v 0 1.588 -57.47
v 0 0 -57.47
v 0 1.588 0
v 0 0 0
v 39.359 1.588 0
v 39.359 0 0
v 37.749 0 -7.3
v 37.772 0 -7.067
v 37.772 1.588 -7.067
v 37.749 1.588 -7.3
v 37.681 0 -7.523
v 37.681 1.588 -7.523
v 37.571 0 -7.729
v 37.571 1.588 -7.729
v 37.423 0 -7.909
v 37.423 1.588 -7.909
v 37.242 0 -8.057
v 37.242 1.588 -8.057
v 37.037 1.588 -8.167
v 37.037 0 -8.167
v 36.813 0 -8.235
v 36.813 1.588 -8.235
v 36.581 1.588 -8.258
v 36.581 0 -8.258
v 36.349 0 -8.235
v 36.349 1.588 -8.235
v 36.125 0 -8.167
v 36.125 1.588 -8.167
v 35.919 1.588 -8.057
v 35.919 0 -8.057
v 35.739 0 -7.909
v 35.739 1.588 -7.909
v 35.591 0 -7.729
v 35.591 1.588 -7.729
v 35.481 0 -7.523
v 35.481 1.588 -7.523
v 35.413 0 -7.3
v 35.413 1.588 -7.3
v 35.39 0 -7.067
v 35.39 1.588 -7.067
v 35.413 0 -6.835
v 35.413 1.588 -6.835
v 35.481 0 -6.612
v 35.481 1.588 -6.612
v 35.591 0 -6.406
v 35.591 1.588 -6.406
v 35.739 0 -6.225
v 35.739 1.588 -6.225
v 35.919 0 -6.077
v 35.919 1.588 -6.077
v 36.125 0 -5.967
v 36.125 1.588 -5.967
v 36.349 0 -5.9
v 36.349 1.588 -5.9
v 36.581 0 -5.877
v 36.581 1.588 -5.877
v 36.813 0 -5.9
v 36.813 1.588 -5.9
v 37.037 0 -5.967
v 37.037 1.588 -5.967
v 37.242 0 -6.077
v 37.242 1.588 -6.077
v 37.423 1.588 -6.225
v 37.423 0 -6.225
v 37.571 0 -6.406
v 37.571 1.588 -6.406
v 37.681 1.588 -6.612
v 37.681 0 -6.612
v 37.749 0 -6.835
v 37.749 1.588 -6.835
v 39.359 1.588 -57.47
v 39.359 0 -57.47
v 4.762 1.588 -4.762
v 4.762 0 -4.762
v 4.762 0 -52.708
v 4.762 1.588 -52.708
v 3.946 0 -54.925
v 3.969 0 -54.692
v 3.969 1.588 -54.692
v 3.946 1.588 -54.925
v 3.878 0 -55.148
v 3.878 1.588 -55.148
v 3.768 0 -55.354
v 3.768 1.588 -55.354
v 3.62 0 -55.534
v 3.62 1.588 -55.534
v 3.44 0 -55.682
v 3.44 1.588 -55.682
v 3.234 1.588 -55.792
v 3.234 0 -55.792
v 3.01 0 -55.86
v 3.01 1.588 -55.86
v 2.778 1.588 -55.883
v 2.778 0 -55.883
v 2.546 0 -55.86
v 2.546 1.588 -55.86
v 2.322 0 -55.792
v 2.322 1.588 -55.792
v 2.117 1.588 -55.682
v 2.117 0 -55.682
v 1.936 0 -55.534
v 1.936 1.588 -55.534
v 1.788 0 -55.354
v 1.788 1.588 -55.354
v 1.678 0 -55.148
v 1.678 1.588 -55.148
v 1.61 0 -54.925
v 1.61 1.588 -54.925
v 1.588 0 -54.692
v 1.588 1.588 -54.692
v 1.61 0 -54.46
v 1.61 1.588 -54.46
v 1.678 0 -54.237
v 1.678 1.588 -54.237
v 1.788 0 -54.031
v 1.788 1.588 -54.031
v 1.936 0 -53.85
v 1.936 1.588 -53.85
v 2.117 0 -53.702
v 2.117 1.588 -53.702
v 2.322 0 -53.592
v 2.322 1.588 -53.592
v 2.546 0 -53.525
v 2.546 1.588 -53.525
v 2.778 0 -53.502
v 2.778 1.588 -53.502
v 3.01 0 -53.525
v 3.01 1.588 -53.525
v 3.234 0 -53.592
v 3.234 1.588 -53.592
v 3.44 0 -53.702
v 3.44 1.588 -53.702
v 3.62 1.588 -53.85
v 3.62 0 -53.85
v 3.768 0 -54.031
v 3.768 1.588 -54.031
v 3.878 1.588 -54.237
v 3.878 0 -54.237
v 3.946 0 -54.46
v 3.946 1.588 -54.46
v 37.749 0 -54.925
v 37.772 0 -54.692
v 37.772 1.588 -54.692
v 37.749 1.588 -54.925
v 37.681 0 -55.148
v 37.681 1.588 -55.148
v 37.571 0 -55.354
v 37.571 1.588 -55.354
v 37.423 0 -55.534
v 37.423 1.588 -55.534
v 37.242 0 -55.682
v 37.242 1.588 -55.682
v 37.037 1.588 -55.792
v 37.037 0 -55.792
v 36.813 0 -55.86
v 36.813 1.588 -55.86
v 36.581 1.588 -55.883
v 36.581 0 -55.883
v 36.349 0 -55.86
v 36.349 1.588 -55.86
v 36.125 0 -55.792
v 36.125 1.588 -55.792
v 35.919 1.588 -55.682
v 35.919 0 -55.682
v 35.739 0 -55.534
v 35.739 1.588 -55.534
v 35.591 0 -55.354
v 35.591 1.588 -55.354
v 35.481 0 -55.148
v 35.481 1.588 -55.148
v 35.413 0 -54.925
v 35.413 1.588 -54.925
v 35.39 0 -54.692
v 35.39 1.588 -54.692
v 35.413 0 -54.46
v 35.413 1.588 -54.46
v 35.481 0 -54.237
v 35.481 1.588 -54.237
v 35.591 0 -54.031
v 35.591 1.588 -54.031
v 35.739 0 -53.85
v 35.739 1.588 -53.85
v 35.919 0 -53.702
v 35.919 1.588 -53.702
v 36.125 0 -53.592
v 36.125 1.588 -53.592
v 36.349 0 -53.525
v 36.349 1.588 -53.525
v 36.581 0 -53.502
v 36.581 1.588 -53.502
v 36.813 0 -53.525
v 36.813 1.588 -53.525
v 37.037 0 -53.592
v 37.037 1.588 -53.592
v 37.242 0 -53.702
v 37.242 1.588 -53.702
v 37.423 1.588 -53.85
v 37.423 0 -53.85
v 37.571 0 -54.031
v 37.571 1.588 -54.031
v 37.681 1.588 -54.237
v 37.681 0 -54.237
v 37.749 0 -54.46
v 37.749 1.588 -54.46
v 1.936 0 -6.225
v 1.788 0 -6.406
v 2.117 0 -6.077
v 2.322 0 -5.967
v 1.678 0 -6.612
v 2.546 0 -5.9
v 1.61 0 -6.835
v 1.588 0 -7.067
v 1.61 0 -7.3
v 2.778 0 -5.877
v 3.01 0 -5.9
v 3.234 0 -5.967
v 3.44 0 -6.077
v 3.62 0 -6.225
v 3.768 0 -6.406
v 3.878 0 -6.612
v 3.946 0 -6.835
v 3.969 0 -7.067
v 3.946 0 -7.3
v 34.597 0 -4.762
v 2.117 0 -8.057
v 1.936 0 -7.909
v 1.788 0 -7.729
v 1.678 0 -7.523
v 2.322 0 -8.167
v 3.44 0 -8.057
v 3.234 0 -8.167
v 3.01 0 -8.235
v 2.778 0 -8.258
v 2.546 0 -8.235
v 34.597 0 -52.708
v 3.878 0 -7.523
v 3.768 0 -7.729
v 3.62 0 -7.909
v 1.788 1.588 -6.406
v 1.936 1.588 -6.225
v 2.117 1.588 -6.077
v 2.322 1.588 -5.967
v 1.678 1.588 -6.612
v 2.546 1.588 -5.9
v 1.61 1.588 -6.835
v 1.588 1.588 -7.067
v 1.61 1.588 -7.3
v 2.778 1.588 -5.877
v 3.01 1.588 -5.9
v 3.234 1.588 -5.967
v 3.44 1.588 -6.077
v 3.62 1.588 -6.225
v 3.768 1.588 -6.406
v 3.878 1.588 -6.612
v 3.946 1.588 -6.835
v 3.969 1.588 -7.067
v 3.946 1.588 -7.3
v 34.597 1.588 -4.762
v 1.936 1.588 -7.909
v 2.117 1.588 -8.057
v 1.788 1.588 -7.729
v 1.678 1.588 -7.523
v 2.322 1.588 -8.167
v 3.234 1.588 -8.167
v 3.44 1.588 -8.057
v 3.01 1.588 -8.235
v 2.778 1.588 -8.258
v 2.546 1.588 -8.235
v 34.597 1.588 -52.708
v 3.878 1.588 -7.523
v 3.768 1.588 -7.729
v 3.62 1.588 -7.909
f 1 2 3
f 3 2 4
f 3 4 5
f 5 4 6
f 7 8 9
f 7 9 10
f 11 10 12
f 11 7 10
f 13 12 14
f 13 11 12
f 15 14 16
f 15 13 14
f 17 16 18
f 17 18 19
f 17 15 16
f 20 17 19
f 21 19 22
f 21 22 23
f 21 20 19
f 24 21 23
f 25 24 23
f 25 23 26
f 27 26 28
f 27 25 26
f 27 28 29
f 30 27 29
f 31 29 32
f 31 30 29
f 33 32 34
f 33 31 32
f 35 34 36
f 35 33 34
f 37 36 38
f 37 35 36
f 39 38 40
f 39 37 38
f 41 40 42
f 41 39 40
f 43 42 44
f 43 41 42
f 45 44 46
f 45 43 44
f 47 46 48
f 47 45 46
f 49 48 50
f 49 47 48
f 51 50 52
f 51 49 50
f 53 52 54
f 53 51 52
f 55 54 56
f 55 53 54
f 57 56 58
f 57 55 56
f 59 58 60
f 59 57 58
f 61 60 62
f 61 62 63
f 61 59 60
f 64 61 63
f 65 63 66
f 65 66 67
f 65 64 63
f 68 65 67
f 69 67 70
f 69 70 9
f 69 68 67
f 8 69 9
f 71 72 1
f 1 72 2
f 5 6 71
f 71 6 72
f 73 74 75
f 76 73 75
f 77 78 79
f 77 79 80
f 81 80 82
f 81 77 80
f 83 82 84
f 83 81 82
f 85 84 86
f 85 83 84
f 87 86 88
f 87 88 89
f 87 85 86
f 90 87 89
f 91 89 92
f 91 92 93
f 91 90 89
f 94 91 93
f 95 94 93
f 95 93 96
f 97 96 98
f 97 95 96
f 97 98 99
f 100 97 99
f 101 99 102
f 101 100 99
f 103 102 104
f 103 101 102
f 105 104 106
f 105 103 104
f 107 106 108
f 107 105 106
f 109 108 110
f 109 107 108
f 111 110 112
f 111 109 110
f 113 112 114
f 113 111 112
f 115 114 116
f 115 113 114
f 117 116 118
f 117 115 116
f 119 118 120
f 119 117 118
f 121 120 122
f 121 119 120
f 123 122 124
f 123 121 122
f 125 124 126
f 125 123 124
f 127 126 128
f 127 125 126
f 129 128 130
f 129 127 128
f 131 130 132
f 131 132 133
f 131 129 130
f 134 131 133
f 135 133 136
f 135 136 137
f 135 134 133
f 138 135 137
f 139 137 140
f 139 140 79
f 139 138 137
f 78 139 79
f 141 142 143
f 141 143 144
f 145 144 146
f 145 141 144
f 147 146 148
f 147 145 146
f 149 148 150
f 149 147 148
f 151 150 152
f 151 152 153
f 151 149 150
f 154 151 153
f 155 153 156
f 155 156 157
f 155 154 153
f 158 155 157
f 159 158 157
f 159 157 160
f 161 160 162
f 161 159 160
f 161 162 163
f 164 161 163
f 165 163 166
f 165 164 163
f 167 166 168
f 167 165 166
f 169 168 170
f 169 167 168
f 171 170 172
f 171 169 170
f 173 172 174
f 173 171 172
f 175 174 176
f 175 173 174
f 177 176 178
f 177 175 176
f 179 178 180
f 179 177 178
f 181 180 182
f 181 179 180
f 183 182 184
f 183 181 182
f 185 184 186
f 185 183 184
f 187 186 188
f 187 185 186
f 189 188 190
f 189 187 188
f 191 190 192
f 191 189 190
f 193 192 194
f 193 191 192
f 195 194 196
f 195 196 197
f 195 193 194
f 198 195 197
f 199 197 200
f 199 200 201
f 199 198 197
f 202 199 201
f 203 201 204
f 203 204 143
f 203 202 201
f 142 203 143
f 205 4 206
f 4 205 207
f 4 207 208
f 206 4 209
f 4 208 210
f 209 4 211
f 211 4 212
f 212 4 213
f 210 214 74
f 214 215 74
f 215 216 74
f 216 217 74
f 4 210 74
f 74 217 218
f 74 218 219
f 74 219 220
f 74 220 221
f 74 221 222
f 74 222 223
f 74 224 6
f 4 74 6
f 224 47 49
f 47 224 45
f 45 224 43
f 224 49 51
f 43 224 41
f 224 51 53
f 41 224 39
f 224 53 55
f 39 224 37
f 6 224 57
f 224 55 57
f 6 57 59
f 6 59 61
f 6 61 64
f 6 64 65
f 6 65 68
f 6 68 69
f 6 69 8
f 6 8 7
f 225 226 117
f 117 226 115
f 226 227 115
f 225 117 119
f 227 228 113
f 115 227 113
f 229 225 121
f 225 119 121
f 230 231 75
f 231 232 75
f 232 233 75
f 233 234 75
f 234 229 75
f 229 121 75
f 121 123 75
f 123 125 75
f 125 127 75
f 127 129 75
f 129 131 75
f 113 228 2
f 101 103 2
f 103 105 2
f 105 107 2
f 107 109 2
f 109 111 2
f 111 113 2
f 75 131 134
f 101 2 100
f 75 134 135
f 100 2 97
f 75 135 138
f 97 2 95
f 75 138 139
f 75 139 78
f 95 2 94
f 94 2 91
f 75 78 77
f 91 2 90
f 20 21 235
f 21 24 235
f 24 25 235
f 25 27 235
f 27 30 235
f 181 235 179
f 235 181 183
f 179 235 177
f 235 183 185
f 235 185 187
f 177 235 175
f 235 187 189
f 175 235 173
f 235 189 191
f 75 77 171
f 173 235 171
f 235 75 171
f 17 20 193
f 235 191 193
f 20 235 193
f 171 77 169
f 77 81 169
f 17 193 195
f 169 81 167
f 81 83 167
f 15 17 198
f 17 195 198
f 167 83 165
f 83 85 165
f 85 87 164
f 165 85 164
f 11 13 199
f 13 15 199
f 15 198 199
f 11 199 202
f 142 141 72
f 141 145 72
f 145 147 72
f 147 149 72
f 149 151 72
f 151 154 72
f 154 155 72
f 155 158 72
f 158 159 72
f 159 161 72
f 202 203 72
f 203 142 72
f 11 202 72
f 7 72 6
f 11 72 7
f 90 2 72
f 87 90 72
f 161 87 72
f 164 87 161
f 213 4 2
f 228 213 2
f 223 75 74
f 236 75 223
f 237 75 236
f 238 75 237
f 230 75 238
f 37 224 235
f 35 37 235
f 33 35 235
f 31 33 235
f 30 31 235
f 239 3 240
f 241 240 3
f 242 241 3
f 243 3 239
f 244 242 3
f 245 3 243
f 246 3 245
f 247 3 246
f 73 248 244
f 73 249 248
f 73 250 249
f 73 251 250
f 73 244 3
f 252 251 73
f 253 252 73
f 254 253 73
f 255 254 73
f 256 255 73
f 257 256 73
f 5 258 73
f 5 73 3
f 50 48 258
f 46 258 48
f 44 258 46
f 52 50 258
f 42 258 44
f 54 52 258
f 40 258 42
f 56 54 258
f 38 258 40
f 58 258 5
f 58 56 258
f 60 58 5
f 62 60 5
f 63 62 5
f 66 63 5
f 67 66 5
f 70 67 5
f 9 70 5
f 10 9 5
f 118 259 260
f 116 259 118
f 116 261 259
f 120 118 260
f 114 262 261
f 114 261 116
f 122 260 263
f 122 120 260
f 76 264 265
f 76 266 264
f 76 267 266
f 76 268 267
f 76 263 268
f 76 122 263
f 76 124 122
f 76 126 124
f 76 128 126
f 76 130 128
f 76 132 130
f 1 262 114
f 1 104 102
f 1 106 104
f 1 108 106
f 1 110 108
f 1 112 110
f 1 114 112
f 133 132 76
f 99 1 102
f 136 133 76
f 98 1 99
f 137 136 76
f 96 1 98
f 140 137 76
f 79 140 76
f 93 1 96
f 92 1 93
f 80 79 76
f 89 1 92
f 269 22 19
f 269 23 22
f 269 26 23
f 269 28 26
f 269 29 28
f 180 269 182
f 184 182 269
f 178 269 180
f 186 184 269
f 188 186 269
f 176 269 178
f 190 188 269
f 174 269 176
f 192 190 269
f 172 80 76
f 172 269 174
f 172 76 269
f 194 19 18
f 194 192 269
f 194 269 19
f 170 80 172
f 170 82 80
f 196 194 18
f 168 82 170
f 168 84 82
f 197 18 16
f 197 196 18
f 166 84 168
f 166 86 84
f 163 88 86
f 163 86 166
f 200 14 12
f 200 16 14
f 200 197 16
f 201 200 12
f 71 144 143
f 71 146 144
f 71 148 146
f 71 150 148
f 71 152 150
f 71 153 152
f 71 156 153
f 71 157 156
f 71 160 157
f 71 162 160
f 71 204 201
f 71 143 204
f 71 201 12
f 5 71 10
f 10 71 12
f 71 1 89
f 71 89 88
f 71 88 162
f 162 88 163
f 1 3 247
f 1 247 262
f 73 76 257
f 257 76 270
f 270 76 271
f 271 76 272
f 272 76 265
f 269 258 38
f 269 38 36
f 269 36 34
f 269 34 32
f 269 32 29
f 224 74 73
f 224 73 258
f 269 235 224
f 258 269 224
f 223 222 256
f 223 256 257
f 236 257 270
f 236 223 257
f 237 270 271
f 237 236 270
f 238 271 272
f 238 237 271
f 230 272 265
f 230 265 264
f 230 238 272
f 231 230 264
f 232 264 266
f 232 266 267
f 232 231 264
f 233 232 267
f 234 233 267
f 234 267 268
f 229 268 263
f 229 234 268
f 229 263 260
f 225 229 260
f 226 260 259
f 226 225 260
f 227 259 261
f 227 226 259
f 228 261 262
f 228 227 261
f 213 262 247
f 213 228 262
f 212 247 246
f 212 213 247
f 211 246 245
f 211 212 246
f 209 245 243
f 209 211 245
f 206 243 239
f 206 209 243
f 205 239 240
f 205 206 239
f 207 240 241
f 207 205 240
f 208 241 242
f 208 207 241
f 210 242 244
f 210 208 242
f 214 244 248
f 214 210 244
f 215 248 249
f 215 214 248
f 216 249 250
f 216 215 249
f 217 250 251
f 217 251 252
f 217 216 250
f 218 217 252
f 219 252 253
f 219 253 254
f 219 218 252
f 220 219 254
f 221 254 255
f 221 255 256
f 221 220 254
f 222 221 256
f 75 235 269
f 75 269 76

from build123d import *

# Parameters (mm, degrees)
SKETCH1_R           = 1.190625
BOSS_EXTRUDE1_DEPTH = 1.5875


with BuildPart() as part:
    # Sketch1 → Boss-Extrude1 (new body)
    with BuildSketch(Plane(origin=(0, 0, 0), x_dir=(1, 0, 0), z_dir=(0, 1, 0))):
        Polygon((0, 54.692295537), (0, 7.067295537), (0, 0), (39.359085702, 0), (39.359085702, 7.067295537), (39.359085702, 54.692295537), (39.359085702, 57.470420537), (0, 57.470420537), align=None)
        with Locations((2.778125, 54.692295537)):
            Circle(SKETCH1_R, mode=Mode.SUBTRACT)
        with Locations((36.580960702, 7.067295537)):
            Circle(SKETCH1_R, mode=Mode.SUBTRACT)
        with Locations((2.778125, 7.067295537)):
            Circle(SKETCH1_R, mode=Mode.SUBTRACT)
        with Locations((36.580960702, 54.692295537)):
            Circle(SKETCH1_R, mode=Mode.SUBTRACT)
        Polygon((4.7625, 52.707920537), (4.7625, 7.067295537), (4.7625, 4.7625), (34.596585702, 4.7625), (34.596585702, 7.067295537), (34.596585702, 52.707920537), align=None, mode=Mode.SUBTRACT)
    extrude(amount=BOSS_EXTRUDE1_DEPTH)


solid = part.part
